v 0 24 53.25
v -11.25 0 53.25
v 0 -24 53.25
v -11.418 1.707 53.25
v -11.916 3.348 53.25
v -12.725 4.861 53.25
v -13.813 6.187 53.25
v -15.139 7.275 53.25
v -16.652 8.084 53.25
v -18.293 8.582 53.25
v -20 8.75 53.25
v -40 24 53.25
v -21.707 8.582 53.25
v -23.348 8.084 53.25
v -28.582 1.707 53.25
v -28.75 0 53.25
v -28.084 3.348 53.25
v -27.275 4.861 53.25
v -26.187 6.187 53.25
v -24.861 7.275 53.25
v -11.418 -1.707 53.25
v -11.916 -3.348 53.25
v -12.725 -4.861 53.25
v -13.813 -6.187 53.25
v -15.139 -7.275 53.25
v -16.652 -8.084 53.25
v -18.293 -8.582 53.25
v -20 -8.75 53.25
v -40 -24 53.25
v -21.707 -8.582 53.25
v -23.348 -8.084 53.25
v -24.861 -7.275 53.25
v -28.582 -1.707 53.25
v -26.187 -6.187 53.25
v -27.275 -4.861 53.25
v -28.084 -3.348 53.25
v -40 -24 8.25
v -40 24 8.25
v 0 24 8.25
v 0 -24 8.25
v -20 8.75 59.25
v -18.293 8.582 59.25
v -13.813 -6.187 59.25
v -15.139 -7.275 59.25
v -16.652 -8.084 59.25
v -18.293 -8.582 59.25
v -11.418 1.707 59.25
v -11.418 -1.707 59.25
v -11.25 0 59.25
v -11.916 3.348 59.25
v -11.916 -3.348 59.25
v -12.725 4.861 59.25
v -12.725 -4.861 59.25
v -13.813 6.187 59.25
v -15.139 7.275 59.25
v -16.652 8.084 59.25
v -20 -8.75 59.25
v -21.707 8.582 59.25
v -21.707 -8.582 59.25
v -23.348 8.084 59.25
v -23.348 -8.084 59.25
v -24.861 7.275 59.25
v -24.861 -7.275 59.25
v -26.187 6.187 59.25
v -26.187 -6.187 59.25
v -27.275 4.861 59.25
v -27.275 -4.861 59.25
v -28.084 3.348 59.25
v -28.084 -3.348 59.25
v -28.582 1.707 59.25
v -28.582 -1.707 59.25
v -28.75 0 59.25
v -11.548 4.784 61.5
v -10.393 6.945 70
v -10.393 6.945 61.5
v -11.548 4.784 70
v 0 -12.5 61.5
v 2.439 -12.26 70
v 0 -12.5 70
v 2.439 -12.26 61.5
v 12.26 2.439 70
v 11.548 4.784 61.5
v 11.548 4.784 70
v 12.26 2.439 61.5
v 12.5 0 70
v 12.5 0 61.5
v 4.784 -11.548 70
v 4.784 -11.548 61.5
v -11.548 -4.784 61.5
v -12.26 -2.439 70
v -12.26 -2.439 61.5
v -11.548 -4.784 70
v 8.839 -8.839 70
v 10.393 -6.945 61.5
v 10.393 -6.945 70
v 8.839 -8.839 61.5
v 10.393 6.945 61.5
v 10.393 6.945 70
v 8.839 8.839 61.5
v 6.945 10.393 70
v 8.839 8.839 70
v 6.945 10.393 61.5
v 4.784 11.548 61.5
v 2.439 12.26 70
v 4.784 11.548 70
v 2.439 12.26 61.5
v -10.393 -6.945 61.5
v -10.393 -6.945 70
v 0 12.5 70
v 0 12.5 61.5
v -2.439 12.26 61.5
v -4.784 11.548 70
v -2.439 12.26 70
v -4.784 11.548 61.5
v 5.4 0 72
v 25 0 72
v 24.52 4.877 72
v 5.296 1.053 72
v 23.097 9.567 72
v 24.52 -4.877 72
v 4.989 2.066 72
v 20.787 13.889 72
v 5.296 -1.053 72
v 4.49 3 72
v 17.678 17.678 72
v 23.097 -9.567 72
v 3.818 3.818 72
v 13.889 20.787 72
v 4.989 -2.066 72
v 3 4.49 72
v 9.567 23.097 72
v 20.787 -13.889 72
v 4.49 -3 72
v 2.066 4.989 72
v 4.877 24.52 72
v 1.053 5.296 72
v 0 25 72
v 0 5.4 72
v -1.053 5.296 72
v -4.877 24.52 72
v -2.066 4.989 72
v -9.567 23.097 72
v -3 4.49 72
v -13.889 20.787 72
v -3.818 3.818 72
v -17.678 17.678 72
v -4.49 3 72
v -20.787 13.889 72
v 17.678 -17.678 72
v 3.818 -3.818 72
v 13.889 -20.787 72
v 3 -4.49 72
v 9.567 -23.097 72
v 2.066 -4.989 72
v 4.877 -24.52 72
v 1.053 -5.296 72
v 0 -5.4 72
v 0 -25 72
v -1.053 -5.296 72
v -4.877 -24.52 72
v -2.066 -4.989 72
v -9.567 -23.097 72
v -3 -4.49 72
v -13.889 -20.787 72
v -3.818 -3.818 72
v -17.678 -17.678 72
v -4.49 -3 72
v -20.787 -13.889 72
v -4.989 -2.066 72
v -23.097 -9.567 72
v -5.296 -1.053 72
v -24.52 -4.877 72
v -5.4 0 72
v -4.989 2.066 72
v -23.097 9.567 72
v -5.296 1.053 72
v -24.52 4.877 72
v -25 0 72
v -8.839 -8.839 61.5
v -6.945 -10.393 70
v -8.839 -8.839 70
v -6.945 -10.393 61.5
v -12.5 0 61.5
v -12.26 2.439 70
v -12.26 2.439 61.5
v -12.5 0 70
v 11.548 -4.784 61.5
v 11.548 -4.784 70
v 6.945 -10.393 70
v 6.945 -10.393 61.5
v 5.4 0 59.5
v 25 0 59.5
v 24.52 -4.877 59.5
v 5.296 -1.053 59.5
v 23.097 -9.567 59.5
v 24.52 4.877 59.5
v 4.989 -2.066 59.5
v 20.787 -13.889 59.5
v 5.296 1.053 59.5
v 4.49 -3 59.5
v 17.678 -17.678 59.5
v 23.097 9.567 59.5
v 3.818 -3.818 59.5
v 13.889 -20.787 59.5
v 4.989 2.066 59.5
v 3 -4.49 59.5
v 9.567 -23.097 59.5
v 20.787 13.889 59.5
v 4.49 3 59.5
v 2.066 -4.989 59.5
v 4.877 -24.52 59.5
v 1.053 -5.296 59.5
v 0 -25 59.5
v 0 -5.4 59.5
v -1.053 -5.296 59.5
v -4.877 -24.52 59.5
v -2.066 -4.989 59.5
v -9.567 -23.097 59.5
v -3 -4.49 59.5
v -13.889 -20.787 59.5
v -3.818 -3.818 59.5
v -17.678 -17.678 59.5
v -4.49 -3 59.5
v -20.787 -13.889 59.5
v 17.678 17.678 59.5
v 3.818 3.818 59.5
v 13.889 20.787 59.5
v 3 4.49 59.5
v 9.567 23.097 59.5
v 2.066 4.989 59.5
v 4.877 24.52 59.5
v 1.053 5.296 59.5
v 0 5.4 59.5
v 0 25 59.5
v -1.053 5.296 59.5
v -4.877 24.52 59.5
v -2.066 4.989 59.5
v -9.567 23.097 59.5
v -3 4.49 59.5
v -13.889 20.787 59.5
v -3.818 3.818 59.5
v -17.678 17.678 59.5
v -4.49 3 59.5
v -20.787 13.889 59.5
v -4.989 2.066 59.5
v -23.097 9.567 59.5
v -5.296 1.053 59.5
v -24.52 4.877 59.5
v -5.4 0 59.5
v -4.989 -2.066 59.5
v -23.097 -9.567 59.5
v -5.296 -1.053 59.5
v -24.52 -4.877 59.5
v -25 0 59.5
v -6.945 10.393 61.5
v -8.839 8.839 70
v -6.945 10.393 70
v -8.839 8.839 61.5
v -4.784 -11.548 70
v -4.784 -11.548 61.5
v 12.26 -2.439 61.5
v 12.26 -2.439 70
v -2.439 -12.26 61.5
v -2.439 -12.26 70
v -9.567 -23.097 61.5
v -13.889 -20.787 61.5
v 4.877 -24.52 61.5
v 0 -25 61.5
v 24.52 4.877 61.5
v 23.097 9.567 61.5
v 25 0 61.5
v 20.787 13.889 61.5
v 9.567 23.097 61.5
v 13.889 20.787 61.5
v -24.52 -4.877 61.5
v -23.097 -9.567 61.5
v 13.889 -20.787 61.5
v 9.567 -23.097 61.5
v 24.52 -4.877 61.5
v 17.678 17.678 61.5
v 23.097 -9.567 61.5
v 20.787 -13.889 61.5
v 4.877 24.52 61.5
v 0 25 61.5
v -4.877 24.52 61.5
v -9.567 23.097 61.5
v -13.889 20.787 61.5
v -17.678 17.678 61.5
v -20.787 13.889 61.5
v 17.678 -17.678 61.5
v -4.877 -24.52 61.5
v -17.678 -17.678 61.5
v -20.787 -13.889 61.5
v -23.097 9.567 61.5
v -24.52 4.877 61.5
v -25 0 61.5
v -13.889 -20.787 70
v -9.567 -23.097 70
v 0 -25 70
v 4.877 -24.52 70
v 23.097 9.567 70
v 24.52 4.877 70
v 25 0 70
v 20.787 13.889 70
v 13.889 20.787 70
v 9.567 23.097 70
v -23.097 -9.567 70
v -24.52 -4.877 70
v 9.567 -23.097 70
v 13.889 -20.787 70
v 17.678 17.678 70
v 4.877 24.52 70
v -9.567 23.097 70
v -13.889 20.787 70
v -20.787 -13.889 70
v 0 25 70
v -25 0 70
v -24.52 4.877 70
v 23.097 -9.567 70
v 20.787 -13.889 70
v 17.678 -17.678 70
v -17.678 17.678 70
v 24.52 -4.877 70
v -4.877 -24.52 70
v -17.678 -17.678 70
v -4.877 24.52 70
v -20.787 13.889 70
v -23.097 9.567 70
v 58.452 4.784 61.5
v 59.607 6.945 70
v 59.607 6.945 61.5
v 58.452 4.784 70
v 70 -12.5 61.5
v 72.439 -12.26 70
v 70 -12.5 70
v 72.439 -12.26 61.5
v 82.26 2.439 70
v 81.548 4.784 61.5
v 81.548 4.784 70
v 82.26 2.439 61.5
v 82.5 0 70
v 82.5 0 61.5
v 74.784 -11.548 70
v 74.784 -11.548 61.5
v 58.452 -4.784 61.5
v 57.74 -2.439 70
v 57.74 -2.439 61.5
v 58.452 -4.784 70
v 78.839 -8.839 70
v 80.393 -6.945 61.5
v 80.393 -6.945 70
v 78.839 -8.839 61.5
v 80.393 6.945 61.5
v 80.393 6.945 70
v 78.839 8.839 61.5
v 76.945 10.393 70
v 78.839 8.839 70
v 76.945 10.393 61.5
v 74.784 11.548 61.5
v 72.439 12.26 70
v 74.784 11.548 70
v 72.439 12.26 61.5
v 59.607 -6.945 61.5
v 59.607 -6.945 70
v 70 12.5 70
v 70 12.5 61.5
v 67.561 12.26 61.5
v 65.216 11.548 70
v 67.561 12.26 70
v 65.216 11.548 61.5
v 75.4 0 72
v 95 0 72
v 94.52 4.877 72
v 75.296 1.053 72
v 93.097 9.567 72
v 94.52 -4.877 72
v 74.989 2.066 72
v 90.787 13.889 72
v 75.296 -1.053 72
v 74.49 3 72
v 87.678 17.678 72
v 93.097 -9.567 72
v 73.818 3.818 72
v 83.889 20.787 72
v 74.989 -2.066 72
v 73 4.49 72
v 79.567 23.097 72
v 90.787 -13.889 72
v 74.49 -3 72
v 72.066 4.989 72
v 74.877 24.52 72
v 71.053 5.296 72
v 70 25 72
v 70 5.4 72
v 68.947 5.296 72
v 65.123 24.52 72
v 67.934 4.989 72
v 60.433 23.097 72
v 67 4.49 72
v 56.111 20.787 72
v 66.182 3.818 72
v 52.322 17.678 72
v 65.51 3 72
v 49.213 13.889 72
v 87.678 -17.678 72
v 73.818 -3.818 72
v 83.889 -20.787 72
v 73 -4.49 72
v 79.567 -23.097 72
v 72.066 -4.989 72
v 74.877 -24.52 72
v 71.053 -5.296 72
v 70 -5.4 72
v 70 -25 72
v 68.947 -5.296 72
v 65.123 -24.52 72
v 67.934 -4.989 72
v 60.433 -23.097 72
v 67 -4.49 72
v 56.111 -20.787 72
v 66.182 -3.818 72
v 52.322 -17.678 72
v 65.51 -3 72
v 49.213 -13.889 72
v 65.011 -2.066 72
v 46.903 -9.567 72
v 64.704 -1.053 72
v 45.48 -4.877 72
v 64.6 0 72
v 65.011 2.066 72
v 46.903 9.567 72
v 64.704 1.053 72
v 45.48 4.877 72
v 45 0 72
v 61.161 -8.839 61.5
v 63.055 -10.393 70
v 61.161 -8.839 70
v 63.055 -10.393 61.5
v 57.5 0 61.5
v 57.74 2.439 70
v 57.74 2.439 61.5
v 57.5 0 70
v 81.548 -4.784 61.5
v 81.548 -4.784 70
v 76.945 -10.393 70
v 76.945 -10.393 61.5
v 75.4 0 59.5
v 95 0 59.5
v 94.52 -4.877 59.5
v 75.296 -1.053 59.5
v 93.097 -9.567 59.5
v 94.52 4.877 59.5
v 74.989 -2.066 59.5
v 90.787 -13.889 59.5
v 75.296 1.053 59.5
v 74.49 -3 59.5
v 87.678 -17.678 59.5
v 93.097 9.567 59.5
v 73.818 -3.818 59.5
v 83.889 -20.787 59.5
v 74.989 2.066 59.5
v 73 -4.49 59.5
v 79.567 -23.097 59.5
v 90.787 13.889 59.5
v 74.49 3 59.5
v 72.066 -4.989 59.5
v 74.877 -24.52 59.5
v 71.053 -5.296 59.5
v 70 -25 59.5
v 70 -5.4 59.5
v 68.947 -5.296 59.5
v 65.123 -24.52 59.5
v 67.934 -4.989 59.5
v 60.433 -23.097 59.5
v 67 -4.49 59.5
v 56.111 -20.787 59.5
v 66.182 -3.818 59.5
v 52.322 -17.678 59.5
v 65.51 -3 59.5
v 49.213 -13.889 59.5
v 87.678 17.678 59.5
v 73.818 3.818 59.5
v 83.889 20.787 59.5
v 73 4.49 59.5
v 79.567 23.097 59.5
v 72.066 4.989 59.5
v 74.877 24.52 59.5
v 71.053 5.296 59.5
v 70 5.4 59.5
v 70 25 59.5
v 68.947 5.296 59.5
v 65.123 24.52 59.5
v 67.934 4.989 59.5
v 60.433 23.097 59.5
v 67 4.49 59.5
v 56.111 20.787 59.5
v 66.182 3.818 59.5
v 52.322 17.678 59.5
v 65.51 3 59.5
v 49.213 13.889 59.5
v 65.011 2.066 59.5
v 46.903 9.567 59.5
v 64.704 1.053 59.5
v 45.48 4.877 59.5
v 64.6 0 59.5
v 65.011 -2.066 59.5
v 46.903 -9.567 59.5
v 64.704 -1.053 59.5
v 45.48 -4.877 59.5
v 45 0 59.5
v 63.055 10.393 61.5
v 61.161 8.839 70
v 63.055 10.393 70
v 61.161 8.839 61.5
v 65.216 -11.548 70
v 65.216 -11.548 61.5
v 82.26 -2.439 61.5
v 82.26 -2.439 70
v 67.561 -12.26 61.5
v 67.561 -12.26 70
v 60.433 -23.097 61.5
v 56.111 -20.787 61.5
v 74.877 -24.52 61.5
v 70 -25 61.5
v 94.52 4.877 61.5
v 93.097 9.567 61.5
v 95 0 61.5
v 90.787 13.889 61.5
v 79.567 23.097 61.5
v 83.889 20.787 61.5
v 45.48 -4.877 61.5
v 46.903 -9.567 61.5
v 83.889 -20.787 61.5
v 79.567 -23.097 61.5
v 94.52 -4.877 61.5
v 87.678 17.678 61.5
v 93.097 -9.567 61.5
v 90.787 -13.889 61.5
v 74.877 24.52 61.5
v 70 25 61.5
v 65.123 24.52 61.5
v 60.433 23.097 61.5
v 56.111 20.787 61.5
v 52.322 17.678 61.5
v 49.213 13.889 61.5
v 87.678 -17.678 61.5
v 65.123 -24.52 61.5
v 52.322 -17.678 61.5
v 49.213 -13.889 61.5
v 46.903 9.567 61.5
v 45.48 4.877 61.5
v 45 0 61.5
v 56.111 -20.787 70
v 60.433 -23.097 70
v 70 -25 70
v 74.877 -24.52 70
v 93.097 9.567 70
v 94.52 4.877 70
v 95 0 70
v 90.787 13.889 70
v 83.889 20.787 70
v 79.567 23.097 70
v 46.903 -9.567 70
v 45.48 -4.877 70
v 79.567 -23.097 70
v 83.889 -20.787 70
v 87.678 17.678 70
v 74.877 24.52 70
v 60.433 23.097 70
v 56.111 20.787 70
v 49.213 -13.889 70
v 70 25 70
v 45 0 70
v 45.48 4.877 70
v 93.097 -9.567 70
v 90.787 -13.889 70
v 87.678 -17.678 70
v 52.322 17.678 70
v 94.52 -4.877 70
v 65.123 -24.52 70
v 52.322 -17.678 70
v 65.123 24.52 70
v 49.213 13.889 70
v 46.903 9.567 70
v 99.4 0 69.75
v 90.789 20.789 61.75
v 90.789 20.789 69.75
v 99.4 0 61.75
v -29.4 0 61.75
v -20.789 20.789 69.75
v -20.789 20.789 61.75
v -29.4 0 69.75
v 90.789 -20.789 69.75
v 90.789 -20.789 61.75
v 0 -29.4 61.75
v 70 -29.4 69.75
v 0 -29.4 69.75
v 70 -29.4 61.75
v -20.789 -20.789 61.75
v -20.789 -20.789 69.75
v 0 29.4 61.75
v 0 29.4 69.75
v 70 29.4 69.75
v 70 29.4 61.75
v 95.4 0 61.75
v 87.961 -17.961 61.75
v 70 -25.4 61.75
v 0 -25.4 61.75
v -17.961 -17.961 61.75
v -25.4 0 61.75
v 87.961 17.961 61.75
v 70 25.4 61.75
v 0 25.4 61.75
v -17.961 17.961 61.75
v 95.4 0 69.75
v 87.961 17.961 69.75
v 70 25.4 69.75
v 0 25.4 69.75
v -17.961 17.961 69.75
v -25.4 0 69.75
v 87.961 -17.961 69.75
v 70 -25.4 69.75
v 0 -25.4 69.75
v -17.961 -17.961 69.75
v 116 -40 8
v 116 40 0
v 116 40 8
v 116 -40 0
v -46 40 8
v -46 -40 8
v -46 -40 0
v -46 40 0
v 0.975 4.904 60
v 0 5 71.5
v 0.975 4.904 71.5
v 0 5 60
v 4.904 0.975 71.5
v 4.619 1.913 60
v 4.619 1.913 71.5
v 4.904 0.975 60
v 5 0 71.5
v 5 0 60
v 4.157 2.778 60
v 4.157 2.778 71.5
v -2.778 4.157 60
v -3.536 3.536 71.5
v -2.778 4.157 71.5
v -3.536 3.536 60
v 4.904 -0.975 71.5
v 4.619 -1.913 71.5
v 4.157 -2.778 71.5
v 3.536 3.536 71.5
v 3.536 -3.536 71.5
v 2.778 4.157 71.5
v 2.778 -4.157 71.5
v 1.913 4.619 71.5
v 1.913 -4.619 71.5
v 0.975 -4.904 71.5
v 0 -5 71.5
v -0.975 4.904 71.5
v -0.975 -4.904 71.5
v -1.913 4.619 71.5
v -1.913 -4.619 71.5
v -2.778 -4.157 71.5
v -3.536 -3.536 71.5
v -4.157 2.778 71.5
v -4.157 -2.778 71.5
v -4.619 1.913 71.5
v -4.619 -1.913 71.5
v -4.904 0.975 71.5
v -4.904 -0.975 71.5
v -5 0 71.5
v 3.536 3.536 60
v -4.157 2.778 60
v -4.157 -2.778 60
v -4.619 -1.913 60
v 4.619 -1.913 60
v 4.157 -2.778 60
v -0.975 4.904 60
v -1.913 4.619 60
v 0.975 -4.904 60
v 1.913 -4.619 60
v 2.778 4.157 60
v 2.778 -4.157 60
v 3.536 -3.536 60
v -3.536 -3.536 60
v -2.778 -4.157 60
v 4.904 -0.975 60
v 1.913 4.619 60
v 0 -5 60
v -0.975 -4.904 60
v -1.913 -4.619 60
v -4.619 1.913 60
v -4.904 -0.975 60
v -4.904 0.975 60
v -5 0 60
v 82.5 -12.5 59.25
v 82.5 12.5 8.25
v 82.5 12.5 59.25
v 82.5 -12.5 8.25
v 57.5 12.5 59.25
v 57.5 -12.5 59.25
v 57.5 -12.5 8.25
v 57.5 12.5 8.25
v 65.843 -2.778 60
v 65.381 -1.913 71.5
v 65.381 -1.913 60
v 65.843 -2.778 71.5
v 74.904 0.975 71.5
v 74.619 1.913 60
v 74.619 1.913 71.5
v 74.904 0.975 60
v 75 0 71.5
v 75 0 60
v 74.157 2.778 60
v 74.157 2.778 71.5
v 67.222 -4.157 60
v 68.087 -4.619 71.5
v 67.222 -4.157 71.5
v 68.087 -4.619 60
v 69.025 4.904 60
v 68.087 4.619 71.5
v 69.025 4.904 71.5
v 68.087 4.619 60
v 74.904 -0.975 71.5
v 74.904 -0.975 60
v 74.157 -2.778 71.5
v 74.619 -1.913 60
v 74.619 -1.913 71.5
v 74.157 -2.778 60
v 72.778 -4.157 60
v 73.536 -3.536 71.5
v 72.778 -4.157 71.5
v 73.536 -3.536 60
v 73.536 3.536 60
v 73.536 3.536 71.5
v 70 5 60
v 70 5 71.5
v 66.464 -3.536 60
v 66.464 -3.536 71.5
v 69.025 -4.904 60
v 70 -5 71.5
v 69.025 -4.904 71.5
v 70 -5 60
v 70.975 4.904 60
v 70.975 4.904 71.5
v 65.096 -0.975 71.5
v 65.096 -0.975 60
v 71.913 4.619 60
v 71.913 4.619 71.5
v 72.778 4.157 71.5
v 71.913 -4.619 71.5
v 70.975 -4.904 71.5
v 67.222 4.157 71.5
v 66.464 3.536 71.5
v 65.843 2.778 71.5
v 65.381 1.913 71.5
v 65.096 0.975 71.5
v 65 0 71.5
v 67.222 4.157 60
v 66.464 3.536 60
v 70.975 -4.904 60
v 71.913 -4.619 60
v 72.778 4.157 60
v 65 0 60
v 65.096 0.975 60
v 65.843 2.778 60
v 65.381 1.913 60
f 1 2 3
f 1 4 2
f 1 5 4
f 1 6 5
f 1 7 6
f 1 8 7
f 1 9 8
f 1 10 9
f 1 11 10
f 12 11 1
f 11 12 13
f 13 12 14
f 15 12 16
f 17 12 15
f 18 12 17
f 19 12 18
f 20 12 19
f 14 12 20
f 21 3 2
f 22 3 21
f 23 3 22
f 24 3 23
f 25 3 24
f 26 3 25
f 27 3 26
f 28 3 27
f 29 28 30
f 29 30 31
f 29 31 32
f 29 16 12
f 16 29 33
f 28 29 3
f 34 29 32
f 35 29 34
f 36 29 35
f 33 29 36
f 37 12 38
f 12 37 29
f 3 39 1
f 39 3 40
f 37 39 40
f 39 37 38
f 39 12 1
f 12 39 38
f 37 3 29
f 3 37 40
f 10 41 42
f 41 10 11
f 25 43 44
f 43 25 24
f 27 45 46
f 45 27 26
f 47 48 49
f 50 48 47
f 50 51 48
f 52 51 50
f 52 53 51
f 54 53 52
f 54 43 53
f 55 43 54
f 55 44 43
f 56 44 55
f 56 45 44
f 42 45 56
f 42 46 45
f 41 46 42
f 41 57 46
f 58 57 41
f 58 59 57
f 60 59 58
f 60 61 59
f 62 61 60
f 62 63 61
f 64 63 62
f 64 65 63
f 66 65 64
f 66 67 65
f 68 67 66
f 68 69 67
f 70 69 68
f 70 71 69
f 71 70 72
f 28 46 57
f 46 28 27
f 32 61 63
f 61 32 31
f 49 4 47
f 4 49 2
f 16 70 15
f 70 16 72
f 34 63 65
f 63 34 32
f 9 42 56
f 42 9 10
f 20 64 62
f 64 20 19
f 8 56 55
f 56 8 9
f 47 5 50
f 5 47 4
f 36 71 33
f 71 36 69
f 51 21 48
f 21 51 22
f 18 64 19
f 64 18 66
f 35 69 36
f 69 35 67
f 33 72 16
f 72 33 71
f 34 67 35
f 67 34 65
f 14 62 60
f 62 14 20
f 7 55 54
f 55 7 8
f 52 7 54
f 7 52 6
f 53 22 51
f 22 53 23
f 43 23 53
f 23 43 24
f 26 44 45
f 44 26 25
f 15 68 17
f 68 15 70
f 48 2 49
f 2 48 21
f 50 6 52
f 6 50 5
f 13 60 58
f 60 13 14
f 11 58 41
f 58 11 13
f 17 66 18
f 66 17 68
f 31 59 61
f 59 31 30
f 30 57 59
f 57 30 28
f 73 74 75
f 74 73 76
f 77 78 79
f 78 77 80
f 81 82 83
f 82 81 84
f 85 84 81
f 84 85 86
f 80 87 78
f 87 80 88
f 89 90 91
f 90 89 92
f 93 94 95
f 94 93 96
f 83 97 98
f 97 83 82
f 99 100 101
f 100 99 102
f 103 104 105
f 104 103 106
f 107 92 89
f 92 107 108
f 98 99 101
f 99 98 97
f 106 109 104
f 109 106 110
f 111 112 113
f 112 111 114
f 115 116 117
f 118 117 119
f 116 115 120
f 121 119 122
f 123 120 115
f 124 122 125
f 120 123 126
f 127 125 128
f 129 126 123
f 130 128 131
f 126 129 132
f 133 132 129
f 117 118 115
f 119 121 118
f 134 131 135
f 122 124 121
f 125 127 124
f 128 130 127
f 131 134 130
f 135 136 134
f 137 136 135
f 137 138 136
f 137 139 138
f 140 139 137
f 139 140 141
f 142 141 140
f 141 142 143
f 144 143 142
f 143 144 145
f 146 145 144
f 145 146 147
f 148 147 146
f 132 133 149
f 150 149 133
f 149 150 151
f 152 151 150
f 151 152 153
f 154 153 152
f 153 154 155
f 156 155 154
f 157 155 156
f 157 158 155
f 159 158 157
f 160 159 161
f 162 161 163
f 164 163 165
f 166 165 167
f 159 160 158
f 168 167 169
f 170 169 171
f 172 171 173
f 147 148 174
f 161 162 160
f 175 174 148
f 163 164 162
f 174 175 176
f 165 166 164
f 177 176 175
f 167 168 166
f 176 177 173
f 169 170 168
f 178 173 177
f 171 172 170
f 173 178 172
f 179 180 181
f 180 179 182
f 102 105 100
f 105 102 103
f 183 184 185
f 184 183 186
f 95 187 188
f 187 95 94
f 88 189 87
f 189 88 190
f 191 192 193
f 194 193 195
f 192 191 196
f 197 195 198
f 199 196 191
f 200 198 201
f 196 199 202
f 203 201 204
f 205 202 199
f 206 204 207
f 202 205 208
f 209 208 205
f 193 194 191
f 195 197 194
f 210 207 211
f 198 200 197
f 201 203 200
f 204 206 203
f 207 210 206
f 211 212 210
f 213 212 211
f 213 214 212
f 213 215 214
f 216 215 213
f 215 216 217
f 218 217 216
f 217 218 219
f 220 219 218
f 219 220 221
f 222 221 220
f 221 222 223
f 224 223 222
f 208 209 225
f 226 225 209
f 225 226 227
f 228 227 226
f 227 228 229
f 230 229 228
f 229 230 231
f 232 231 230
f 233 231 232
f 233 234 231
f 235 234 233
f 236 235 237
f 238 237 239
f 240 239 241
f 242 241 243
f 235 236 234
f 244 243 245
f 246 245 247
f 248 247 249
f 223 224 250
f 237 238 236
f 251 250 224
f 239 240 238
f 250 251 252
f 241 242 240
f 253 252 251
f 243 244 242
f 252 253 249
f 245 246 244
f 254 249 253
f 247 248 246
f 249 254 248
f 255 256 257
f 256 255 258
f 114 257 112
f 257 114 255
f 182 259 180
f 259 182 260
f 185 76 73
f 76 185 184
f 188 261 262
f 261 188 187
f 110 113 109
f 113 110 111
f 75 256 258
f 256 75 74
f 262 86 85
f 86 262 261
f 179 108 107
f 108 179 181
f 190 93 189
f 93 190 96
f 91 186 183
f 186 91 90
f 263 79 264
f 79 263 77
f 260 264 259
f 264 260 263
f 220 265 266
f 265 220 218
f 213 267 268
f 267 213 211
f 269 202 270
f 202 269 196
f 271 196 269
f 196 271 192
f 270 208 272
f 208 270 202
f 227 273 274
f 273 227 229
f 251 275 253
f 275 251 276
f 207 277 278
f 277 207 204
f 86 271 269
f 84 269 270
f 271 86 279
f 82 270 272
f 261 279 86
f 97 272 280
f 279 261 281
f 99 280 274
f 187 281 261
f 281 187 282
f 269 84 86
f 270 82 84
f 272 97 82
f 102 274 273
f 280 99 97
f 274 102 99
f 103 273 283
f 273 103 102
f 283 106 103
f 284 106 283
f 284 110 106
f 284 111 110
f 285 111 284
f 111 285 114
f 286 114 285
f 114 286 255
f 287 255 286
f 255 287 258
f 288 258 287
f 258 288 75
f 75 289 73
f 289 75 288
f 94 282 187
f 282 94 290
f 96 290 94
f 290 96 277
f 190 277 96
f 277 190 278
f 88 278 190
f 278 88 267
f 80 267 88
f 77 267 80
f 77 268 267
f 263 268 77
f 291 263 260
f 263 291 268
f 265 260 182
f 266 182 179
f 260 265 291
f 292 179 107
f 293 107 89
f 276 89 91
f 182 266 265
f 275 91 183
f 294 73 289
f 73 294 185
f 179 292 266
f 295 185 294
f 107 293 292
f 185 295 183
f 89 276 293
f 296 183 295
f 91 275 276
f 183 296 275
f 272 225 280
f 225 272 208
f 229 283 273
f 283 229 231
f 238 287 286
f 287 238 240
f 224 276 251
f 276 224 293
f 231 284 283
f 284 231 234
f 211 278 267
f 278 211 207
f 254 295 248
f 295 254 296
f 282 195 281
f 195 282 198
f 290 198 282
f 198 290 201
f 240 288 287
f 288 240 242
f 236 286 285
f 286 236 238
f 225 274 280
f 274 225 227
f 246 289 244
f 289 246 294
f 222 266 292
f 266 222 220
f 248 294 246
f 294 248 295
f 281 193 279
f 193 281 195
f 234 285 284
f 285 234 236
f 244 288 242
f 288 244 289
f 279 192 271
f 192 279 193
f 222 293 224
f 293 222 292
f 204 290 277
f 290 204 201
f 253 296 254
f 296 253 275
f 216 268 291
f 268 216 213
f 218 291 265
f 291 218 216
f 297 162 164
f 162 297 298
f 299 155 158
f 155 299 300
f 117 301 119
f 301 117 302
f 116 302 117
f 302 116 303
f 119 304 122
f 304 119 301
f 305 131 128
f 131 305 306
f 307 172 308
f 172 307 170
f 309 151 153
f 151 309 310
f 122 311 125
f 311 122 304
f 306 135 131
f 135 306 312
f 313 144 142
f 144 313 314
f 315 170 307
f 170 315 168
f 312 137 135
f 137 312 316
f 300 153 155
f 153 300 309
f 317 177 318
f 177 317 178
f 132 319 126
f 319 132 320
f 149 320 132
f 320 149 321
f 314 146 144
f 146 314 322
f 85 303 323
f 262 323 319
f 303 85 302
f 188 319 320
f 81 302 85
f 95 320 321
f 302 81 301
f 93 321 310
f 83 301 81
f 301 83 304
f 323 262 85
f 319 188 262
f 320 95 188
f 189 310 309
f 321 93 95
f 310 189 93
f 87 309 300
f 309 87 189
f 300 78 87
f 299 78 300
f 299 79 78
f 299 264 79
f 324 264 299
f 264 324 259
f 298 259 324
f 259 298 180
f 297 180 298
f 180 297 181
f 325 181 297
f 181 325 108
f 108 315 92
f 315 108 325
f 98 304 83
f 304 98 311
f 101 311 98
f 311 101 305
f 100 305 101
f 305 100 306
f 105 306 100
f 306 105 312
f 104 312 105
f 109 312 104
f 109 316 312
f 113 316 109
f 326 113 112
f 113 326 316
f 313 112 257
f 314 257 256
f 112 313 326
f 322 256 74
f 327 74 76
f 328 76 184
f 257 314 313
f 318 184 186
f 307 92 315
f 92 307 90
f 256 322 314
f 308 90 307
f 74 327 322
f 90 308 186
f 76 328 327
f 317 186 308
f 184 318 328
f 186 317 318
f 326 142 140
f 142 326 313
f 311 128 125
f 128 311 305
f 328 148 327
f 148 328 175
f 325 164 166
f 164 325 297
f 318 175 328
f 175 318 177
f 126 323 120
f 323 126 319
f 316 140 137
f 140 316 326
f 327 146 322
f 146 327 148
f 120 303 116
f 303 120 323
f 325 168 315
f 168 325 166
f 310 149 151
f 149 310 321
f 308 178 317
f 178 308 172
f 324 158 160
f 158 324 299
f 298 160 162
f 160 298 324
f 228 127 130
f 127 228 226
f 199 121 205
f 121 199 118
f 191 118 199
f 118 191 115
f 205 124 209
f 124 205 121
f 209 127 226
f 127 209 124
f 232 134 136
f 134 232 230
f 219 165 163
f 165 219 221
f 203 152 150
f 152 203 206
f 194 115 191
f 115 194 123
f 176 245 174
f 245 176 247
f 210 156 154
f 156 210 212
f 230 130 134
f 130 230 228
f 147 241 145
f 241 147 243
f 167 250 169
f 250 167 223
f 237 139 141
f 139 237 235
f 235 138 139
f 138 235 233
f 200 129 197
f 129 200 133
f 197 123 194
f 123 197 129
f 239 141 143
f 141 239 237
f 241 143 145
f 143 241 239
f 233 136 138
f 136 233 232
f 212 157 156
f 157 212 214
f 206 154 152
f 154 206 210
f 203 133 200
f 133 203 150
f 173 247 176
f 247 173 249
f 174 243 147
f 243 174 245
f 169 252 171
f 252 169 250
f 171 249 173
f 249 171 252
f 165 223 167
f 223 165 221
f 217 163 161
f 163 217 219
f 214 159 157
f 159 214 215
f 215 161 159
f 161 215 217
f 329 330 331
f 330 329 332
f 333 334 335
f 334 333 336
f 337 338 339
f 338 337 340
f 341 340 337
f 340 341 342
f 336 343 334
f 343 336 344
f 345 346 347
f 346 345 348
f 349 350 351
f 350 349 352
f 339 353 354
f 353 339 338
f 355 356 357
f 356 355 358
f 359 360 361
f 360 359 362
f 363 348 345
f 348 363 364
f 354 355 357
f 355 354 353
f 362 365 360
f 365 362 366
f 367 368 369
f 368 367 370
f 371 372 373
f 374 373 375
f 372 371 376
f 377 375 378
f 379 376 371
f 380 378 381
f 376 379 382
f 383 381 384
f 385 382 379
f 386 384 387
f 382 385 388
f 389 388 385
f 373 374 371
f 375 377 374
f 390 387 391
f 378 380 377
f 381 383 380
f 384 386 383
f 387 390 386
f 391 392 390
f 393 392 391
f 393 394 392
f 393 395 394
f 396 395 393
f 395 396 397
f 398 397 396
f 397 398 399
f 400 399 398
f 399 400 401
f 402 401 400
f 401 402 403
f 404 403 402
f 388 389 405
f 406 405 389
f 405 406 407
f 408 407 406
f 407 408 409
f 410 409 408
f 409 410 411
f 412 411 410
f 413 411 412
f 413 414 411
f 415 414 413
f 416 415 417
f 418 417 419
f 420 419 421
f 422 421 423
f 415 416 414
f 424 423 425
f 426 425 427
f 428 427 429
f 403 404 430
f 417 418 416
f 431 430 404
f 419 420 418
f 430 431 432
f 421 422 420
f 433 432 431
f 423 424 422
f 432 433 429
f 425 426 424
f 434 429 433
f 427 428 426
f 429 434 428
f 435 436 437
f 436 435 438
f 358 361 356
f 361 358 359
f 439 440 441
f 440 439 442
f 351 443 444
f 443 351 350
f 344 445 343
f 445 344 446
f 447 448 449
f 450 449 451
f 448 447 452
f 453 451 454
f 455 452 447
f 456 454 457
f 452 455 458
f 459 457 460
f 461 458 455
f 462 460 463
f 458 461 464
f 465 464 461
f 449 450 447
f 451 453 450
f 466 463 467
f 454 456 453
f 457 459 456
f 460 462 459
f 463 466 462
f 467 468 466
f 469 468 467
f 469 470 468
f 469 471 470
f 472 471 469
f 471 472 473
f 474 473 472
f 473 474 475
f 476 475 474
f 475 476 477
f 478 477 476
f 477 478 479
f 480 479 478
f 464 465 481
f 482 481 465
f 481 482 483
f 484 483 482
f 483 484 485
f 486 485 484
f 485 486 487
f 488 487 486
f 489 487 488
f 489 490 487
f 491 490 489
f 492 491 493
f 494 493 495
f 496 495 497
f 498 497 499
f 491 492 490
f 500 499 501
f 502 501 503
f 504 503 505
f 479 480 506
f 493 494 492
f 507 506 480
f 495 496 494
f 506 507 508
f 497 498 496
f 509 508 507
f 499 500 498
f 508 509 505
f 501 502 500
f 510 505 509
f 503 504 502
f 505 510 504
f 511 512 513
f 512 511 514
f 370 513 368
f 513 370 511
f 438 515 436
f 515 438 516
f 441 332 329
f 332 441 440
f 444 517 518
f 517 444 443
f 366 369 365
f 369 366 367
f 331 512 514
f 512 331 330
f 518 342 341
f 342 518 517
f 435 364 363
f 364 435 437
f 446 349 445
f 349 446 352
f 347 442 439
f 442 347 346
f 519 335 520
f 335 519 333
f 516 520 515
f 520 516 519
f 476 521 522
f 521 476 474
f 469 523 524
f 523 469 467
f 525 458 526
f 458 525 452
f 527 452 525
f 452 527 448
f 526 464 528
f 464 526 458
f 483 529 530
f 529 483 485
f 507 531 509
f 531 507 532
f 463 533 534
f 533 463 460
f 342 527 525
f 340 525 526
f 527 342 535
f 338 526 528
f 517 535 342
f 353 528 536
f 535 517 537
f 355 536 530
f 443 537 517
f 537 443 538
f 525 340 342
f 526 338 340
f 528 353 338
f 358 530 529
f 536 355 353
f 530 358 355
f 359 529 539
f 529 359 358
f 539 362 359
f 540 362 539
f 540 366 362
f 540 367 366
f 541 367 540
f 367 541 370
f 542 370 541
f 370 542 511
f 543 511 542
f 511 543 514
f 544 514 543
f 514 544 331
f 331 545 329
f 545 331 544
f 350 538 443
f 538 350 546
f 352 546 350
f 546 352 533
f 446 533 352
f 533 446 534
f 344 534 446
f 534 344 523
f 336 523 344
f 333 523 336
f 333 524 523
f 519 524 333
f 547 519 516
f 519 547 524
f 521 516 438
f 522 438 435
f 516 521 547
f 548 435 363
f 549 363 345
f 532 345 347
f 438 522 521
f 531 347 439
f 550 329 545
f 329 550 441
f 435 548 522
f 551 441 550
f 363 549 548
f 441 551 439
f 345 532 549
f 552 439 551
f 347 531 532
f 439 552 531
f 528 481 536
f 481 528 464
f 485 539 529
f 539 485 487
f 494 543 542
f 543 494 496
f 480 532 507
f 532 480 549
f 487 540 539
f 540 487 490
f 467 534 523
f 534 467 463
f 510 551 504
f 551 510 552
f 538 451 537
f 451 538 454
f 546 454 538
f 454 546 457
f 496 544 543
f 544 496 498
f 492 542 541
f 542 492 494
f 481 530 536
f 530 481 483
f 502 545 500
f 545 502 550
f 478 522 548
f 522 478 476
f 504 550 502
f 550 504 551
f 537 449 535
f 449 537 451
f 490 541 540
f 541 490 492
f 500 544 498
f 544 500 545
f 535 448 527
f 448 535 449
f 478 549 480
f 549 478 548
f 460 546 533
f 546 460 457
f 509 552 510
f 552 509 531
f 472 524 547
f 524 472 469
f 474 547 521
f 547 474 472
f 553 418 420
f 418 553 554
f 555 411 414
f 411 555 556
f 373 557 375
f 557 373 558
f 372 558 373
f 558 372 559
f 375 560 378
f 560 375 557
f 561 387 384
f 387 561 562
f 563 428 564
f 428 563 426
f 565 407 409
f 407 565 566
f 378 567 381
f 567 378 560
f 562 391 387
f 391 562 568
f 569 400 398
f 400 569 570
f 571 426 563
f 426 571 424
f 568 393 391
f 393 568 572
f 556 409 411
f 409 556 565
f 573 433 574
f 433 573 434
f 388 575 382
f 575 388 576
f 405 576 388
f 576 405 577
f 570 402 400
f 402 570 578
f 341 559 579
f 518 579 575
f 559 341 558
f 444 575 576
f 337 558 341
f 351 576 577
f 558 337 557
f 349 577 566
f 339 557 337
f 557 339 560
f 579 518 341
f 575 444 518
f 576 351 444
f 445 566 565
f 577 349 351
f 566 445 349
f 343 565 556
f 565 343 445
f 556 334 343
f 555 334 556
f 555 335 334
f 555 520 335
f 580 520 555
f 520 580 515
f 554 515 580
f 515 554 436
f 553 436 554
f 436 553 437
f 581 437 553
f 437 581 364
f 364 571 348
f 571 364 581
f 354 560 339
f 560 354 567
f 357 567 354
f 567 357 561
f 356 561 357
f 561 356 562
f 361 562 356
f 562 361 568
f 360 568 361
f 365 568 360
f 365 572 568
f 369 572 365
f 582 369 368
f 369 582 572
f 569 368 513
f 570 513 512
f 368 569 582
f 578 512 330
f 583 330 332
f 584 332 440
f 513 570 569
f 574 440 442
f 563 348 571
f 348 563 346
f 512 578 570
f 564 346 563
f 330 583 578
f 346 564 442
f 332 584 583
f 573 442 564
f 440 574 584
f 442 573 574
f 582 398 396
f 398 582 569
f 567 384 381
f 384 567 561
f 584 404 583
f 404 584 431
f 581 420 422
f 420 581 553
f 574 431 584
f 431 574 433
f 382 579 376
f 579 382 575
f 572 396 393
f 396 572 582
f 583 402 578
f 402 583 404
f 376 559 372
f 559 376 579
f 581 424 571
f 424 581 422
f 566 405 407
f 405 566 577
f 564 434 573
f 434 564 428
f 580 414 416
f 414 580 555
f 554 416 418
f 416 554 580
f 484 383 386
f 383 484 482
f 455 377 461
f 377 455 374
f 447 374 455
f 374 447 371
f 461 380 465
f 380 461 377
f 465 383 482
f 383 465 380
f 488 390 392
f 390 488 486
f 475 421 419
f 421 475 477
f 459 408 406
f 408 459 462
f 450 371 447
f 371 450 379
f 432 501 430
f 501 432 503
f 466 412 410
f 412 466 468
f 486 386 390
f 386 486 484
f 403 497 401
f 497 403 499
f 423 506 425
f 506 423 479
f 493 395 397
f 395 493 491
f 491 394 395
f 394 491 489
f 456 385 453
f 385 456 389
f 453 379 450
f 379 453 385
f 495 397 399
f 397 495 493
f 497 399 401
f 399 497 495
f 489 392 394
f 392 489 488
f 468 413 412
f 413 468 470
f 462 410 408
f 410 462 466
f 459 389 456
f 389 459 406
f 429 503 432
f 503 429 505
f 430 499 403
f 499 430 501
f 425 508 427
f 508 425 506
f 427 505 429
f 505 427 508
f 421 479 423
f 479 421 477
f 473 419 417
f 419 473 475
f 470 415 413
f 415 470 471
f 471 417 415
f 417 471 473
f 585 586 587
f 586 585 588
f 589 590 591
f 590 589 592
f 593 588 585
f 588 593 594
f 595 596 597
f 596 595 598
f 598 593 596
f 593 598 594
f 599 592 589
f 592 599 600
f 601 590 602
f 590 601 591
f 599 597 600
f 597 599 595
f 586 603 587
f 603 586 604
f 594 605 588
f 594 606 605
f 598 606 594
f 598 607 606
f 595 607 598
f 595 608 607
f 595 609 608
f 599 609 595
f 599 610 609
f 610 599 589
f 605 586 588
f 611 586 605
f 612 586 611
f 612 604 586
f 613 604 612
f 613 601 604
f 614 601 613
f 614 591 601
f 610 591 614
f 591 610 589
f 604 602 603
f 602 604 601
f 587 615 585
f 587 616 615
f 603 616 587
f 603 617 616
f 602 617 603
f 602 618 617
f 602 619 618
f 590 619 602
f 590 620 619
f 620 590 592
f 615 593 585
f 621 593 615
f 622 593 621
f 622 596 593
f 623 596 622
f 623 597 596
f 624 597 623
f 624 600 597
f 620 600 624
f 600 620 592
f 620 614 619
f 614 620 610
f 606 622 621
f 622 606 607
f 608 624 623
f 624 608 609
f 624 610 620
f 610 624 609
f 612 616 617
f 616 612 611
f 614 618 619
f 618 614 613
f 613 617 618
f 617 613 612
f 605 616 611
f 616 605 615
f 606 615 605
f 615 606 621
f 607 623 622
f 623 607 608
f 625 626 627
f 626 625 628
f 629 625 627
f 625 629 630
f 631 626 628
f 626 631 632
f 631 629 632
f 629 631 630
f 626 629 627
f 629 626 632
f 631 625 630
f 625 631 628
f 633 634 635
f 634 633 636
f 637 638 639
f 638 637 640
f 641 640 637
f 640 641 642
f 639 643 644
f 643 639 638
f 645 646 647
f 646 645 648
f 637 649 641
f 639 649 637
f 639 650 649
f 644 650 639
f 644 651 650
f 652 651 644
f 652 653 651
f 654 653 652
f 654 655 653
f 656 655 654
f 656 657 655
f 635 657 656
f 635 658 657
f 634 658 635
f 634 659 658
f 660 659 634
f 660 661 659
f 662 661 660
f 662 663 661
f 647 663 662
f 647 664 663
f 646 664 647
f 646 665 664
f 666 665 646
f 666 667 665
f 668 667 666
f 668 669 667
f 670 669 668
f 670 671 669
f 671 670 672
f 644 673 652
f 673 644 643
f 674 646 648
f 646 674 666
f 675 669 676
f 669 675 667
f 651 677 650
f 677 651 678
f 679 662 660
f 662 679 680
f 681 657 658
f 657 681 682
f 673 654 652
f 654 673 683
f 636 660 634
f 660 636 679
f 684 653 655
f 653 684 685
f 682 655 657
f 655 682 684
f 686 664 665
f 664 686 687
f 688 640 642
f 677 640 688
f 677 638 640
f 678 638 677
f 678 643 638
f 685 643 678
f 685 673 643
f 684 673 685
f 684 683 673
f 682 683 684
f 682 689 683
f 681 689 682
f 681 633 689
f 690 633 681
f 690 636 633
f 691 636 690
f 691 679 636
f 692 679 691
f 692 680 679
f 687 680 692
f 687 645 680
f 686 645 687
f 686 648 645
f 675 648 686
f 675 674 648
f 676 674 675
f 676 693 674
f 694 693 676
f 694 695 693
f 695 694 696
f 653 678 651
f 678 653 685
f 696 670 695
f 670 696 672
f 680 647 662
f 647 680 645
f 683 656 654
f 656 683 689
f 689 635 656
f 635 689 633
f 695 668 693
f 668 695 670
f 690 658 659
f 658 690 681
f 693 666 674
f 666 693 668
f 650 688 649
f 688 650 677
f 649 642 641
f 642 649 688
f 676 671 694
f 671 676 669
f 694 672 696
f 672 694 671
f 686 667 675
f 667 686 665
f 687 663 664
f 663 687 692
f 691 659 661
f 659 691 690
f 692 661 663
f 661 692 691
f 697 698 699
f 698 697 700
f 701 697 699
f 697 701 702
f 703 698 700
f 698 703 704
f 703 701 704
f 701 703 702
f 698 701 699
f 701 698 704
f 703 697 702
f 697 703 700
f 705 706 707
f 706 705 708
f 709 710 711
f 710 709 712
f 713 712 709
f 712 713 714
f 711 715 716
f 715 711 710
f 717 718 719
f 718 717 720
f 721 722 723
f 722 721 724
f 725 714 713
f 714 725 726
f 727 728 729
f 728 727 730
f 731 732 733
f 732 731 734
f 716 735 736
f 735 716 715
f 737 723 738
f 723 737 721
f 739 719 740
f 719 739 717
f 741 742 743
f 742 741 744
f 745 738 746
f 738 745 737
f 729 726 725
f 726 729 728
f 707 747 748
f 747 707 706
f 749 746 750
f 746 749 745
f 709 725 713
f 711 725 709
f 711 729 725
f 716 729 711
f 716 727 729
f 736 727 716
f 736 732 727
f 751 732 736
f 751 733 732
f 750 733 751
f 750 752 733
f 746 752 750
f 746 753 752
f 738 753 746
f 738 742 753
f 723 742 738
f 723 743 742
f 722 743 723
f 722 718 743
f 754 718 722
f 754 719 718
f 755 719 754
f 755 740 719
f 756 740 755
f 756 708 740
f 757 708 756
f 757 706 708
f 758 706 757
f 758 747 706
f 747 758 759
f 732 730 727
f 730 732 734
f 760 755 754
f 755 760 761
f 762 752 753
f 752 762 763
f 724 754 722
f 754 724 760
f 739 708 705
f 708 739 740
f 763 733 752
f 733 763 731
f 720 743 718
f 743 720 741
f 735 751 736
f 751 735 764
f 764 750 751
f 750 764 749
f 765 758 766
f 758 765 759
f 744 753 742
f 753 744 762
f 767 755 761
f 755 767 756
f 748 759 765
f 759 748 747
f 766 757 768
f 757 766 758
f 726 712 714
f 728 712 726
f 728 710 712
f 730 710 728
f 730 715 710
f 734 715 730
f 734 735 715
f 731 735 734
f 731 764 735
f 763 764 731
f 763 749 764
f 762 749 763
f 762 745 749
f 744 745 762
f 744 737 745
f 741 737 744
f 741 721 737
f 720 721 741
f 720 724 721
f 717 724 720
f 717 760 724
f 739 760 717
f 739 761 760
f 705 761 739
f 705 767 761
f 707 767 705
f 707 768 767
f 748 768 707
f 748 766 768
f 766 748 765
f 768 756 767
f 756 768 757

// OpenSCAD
$fn = 32;

// ------------------------------------------------------------------------
// Motor belt drive: span 70 mm, pulleys d50, belt 8 mm wide
// Every part is its own module, assembly() places every instance.
// ------------------------------------------------------------------------

// --- part 1 ---
module base_plate() {
  difference() {
    translate([-81, -40, 0]) cube([162, 80, 8]);
  }
}

// --- part 2 ---
module motor() {
  union() {
    translate([-22.5, -24, 0]) cube([45, 48, 40]);
    translate([25.5, 0, 20]) rotate([0, 90, 0]) cylinder(h = 6, d = 17.5, center = true);
  }
}

// --- part 3 ---
module drive_shaft() {
  translate([0, 0, -5.75]) cylinder(h = 11.5, d = 10);
}

// --- part 4 ---
module pulley_drive() {
  difference() {
    union() {
      cylinder(h = 12.5, d = 25);
      cylinder(h = 2, d = 50);
      translate([0, 0, 10.5]) cylinder(h = 2, d = 50);
    }
    translate([0, 0, -1]) cylinder(h = 14.5, d = 10.8);
  }
}

// --- part 5 ---
module idler_post() {
  translate([-12.5, -12.5, 0]) cube([25, 25, 51]);
}

// --- part 6 ---
module driven_shaft() {
  translate([0, 0, -5.75]) cylinder(h = 11.5, d = 10);
}

// --- part 7 ---
module pulley_driven() {
  difference() {
    union() {
      cylinder(h = 12.5, d = 25);
      cylinder(h = 2, d = 50);
      translate([0, 0, 10.5]) cylinder(h = 2, d = 50);
    }
    translate([0, 0, -1]) cylinder(h = 14.5, d = 10.8);
  }
}

// --- part 8 ---
module drive_belt() {
  difference() {
    linear_extrude(height = 8) polygon(points = concat([for (a = [90 : 45 : 270]) [29.4 * cos(a), 29.4 * sin(a)]], [for (a = [270 : 45 : 450]) [70 + 29.4 * cos(a), 29.4 * sin(a)]]));
    translate([0, 0, -1]) linear_extrude(height = 10) polygon(points = concat([for (a = [90 : 45 : 270]) [25.4 * cos(a), 25.4 * sin(a)]], [for (a = [270 : 45 : 450]) [70 + 25.4 * cos(a), 25.4 * sin(a)]]));
  }
}

// --- assembly ---
module assembly() {
  color([0.80, 0.24, 0.20]) translate([35, 0, 0]) rotate([0, 0, 0]) base_plate();
  color([0.20, 0.45, 0.75]) translate([0, 0, 30.75]) rotate([0, 270, 0]) motor();
  color([0.25, 0.62, 0.32]) translate([0, 0, 65.75]) rotate([0, 0, 0]) drive_shaft();
  color([0.92, 0.70, 0.18]) translate([0, 0, 59.5]) rotate([0, 0, 0]) pulley_drive();
  color([0.58, 0.35, 0.70]) translate([70, 0, 8.25]) rotate([0, 0, 0]) idler_post();
  color([0.16, 0.66, 0.66]) translate([70, 0, 65.75]) rotate([0, 0, 0]) driven_shaft();
  color([0.85, 0.48, 0.18]) translate([70, 0, 59.5]) rotate([0, 0, 0]) pulley_driven();
  color([0.55, 0.60, 0.65]) translate([0, 0, 61.75]) rotate([0, 0, 0]) drive_belt();
}

assembly();
